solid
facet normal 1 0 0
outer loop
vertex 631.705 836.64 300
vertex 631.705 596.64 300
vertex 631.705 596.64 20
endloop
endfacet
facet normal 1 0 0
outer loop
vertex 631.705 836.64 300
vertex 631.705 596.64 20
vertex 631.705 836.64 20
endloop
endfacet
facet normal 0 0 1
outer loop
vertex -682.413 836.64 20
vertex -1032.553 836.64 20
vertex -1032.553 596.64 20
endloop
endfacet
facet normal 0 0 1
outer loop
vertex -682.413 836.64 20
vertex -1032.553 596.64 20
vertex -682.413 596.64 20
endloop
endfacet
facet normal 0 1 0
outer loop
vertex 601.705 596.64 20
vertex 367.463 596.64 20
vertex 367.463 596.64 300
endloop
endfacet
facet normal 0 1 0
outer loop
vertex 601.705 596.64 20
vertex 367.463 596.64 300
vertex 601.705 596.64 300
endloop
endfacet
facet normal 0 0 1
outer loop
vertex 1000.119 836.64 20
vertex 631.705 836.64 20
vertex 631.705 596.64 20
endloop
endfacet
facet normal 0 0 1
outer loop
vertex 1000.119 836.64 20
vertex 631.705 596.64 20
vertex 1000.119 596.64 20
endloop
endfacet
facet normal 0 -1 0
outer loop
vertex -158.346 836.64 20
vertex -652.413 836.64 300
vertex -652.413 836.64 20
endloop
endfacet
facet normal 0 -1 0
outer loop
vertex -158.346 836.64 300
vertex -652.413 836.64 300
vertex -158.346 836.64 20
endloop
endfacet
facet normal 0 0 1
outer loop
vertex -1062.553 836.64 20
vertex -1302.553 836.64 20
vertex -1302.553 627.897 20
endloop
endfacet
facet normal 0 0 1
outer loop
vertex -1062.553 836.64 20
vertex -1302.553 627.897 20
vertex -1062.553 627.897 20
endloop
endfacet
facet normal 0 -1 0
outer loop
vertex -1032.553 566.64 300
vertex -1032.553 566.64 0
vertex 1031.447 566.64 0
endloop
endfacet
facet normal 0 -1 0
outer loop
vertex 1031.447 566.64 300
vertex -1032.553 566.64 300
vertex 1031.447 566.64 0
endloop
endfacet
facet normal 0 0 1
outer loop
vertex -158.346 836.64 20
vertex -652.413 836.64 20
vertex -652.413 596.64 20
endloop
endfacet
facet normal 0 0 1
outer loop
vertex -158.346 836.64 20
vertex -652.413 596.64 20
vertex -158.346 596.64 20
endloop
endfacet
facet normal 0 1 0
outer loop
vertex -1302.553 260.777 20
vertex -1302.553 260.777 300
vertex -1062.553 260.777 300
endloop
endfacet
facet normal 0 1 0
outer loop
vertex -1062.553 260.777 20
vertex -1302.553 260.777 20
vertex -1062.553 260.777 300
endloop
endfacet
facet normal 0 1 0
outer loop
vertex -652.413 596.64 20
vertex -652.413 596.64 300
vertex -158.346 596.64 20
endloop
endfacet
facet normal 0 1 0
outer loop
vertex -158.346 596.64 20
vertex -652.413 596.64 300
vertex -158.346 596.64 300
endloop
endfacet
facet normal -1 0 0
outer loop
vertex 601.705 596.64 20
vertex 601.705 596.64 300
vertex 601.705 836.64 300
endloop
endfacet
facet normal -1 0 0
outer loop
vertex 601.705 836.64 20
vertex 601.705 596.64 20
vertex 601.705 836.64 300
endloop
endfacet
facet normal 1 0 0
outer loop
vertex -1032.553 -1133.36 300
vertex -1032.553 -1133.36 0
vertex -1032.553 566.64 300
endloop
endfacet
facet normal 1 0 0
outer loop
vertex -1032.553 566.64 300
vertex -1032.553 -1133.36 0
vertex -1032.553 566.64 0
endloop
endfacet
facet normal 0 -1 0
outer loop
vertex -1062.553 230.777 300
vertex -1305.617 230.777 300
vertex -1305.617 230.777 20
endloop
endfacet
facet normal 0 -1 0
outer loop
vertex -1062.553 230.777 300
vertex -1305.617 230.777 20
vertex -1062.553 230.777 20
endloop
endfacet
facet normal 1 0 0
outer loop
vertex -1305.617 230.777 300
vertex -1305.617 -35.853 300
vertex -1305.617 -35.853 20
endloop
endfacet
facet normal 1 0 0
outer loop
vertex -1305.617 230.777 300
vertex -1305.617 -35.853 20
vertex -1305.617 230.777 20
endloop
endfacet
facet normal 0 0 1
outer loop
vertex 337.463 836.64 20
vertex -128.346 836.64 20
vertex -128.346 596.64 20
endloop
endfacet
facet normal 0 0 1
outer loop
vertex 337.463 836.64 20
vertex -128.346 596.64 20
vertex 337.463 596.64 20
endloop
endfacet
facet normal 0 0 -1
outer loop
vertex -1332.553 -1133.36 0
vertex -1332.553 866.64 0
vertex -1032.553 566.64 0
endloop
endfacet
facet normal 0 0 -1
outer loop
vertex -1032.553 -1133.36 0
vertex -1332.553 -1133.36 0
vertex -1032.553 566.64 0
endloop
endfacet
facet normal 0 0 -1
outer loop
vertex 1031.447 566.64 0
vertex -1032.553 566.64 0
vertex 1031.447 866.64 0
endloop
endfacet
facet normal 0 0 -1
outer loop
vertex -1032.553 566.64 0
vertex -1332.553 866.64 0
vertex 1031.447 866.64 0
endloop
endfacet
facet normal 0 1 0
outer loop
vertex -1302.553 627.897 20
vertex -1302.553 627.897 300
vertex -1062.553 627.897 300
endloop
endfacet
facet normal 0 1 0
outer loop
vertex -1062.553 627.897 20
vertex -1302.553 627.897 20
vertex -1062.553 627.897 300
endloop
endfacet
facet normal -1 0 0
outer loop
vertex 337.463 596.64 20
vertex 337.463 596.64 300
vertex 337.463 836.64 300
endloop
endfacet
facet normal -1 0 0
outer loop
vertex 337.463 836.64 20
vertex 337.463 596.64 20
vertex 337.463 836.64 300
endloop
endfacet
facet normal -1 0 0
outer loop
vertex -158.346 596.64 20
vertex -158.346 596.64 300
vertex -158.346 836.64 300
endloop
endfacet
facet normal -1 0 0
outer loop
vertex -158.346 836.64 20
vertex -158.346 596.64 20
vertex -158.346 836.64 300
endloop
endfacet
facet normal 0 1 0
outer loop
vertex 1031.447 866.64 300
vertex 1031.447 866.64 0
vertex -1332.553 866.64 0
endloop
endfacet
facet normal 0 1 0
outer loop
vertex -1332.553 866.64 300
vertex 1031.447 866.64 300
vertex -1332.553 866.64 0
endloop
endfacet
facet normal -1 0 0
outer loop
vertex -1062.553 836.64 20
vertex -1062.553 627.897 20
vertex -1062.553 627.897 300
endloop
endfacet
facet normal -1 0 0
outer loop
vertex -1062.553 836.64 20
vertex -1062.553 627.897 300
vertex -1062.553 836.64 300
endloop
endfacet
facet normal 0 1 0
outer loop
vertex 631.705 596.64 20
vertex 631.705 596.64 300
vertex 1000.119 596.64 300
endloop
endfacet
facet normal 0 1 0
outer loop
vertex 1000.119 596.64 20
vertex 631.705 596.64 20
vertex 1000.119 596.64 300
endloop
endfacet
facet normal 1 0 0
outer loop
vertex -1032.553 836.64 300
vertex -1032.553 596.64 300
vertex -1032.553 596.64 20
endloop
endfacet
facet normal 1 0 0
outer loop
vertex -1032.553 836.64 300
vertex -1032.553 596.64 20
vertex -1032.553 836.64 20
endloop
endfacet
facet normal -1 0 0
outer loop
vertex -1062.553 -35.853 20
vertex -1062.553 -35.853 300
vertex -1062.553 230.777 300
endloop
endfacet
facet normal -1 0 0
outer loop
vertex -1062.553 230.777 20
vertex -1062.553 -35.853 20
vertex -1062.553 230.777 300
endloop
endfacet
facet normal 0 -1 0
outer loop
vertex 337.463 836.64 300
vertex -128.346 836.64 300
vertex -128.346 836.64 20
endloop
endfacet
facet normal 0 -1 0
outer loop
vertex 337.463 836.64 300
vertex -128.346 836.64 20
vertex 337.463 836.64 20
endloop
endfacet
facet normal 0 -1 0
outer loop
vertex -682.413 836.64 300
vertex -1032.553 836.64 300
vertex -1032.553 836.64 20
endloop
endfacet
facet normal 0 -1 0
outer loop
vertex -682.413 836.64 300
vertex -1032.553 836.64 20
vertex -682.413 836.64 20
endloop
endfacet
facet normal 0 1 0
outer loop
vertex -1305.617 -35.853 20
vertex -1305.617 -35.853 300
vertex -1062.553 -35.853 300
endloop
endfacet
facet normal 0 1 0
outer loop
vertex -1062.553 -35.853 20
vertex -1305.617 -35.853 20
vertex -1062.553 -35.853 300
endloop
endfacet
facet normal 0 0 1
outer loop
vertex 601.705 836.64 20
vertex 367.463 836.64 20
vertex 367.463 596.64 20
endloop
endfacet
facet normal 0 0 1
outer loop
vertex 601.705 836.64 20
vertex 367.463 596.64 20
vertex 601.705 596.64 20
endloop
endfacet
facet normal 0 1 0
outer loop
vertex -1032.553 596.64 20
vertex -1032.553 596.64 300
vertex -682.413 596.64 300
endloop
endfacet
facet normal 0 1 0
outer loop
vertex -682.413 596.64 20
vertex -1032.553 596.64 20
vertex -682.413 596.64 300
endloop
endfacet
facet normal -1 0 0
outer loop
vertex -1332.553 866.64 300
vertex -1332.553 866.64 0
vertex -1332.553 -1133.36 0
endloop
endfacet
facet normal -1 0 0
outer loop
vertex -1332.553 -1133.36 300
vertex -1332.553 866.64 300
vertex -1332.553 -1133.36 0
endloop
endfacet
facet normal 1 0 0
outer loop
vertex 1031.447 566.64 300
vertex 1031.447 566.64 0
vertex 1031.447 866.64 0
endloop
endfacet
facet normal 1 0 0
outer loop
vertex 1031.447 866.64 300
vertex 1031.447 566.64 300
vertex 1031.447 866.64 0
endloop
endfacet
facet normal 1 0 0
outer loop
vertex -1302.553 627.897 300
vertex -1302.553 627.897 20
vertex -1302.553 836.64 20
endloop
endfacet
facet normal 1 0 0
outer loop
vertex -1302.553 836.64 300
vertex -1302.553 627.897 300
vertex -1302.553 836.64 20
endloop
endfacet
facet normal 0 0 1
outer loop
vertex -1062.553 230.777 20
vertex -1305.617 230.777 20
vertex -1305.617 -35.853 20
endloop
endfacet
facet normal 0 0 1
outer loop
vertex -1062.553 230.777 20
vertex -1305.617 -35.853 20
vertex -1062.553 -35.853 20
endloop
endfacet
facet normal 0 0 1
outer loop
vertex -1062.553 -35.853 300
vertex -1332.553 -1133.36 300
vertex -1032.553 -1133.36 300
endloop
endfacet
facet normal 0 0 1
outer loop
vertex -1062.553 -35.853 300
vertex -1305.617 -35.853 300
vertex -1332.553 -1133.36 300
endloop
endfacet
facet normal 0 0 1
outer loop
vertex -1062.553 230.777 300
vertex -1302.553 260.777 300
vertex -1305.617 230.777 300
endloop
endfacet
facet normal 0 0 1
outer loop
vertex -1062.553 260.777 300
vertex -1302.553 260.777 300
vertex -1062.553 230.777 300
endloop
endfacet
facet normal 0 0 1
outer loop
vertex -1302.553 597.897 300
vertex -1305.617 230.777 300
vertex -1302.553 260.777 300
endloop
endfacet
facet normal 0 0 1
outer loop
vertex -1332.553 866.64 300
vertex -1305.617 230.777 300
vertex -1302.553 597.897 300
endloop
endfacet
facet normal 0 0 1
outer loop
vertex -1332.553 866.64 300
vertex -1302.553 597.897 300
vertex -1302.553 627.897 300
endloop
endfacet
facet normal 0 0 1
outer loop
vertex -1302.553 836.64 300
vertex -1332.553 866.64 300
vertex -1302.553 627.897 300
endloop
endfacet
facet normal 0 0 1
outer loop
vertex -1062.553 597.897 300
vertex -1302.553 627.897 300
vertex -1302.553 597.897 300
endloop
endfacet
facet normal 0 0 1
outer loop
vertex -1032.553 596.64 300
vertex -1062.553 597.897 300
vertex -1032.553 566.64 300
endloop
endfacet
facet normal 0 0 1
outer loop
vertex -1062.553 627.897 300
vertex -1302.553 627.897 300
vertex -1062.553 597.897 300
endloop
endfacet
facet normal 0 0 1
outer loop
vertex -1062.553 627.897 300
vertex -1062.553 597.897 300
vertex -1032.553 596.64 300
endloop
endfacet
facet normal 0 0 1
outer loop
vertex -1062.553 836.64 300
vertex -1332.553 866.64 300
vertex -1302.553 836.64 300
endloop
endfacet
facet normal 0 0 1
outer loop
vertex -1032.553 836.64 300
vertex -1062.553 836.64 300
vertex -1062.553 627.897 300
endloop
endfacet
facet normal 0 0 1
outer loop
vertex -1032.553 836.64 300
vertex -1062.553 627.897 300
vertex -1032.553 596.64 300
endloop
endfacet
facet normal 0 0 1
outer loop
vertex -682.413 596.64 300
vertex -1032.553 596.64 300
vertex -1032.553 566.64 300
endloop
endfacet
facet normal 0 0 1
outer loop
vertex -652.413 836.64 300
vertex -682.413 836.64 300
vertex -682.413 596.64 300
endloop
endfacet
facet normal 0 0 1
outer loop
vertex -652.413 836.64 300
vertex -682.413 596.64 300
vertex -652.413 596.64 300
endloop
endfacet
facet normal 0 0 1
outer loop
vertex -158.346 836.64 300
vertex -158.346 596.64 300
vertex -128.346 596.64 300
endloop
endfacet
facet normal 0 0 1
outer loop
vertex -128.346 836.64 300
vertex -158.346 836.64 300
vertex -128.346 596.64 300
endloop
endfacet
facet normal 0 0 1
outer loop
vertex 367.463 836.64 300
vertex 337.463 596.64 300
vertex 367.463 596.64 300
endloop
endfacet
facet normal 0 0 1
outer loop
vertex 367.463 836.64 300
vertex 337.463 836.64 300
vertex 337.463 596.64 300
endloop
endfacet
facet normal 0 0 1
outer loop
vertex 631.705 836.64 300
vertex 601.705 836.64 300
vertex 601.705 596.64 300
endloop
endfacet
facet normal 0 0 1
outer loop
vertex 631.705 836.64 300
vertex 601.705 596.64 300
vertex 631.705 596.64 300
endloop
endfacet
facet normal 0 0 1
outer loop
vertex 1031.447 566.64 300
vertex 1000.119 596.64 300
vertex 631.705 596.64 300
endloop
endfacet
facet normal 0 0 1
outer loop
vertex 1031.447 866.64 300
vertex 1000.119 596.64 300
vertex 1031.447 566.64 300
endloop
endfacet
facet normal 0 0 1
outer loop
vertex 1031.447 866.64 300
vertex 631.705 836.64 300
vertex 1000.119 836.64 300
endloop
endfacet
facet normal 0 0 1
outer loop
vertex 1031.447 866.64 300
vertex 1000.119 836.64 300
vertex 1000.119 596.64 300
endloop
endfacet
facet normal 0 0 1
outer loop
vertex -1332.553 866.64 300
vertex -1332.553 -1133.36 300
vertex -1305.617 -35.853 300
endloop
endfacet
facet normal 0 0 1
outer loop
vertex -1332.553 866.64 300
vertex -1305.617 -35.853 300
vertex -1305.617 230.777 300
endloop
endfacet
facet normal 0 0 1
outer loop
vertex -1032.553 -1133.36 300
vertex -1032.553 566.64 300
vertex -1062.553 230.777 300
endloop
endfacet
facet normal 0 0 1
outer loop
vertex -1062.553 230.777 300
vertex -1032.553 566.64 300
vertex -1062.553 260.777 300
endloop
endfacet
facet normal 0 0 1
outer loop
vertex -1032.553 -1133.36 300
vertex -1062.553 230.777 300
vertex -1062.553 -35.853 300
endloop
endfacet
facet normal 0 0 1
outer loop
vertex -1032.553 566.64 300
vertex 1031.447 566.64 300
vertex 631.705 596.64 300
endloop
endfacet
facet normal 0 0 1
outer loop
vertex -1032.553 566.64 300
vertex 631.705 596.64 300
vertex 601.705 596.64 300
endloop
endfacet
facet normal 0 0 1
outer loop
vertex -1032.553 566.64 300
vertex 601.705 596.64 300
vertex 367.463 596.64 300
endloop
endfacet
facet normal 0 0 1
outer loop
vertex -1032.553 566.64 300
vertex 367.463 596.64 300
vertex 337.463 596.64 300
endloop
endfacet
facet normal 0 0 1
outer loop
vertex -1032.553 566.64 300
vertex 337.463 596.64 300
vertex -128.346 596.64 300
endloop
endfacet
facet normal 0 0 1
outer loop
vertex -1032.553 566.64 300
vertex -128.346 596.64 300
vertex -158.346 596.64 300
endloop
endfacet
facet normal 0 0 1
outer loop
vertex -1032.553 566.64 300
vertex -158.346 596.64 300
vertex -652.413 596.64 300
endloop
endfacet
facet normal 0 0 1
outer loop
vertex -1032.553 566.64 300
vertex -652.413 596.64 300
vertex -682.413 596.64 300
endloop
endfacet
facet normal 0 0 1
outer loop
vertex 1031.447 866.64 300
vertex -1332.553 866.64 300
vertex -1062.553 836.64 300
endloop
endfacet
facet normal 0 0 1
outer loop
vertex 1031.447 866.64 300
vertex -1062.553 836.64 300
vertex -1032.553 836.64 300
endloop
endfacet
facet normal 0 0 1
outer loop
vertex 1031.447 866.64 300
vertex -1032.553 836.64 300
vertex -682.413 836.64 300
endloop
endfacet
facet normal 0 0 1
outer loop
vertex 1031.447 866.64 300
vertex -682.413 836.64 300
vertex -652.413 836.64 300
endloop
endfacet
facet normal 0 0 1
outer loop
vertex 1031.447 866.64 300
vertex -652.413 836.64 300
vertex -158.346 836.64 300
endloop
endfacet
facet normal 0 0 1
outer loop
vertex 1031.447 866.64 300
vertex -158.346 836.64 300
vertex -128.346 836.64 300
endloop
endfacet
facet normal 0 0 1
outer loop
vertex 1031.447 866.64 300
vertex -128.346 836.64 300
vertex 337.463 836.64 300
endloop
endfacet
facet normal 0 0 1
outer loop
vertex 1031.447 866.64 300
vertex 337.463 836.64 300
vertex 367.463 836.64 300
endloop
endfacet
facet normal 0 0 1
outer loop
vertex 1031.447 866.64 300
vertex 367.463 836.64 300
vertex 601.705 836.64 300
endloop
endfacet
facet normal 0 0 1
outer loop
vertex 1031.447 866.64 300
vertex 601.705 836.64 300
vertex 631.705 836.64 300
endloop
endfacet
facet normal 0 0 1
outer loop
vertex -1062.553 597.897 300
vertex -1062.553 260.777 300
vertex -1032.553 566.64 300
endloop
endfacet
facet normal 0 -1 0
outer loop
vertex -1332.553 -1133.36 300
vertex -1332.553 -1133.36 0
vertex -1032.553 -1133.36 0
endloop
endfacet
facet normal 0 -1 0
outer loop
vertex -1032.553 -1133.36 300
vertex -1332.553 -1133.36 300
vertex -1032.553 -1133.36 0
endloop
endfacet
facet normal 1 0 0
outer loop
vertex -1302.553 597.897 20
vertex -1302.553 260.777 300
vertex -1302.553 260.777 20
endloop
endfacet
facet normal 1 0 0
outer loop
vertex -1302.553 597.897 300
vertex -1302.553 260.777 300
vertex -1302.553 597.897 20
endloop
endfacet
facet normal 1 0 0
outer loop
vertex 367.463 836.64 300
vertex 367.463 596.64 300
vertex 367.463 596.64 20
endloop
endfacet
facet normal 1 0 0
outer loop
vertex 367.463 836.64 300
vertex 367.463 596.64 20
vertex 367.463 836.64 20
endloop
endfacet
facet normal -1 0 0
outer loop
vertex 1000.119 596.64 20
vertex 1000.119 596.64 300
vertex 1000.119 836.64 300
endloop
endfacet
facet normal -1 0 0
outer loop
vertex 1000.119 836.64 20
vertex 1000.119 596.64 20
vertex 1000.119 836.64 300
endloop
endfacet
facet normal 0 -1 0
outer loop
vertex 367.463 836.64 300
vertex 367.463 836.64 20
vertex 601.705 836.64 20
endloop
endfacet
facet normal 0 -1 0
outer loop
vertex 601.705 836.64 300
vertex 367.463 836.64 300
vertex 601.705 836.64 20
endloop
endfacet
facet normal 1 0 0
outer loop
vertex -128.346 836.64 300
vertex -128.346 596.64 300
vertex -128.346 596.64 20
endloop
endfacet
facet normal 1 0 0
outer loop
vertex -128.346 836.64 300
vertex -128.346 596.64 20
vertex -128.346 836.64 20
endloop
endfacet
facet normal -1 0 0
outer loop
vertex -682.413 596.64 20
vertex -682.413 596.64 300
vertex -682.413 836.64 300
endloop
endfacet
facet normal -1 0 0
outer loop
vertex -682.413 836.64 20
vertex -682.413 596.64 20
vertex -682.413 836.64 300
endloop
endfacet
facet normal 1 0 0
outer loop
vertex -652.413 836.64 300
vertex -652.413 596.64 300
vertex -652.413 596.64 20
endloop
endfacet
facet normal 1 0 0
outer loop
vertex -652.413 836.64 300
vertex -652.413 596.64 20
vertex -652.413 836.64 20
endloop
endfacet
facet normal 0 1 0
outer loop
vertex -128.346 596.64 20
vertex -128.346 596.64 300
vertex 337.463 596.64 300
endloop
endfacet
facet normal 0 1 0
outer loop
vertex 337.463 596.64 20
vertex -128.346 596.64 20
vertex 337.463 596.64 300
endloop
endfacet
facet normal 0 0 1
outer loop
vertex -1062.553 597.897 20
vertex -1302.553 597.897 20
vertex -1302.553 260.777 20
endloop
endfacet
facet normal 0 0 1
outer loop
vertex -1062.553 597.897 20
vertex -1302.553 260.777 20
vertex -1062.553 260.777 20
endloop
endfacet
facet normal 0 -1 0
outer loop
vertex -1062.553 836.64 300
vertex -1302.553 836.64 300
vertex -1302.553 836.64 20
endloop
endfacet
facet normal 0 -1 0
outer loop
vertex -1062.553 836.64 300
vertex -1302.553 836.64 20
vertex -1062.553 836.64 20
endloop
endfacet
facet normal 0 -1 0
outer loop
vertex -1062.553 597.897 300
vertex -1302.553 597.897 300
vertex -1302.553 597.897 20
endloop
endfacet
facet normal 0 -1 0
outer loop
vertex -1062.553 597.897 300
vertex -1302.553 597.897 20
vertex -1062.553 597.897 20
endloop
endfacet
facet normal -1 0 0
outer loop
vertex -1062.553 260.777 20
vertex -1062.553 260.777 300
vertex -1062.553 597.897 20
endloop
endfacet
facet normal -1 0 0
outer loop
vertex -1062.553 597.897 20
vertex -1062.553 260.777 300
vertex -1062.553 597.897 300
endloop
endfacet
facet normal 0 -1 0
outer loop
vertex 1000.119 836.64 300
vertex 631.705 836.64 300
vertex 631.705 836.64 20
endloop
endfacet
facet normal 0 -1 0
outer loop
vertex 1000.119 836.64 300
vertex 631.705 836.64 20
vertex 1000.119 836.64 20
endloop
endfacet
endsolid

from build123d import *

# Parameters (mm, degrees)
F0_W     = 2064
F0_H     = 300
F1_DEPTH = 300
F2_W     = 243.0647516251
F2_H     = 266.6307017207
F2_W_2   = 240
F2_H_2   = 337.1192961931
F2_H_3   = 208.7436437607
F2_W_3   = 350.139864234
F2_H_4   = 240
F2_W_4   = 494.0672528744
F2_W_5   = 465.8082723618
F2_W_6   = 234.2424714565
F2_W_7   = 368.4137177467
F3_DEPTH = 280


# Not quite as in the source:
# - a feature names something its author has since deleted; it is built from what else it names


with BuildPart() as f1:
    # F0 (on Top) → F1 (new body)
    with BuildSketch(Plane.XY):
        Polygon((-1332.5527270117, 866.6404155501), (-1332.5527270117, -1133.3595844499), (-1032.5527270117, -1133.3595844499), (-1032.5527270117, 566.6404155501), (-1032.5527270117, 866.6404155501), align=None)
        with Locations((-0.5527270117, 716.6404155501)):
            Rectangle(F0_W, F0_H)
    extrude(amount=F1_DEPTH)

    # F2 (on face) → F3 (cut)
    with BuildSketch(Plane.XY.offset(300)):
        with Locations((-1184.0851028242, 97.462124736)):
            Rectangle(F2_W, F2_H)
        with Locations((-1182.5527270117, 429.3371236929)):
            Rectangle(F2_W_2, F2_H_2)
        with Locations((-1182.5527270117, 732.2685936698)):
            Rectangle(F2_W_2, F2_H_3)
        with Locations((-857.4827948947, 716.6404155501)):
            Rectangle(F2_W_3, F2_H_4)
        with Locations((-405.3792363405, 716.6404155501)):
            Rectangle(F2_W_4, F2_H_4)
        with Locations((104.5585262775, 716.6404155501)):
            Rectangle(F2_W_5, F2_H_4)
        with Locations((484.5838981867, 716.6404155501)):
            Rectangle(F2_W_6, F2_H_4)
        with Locations((815.9119927883, 716.6404155501)):
            Rectangle(F2_W_7, F2_H_4)
    extrude(amount=-F3_DEPTH, mode=Mode.SUBTRACT)


solid = f1.part
